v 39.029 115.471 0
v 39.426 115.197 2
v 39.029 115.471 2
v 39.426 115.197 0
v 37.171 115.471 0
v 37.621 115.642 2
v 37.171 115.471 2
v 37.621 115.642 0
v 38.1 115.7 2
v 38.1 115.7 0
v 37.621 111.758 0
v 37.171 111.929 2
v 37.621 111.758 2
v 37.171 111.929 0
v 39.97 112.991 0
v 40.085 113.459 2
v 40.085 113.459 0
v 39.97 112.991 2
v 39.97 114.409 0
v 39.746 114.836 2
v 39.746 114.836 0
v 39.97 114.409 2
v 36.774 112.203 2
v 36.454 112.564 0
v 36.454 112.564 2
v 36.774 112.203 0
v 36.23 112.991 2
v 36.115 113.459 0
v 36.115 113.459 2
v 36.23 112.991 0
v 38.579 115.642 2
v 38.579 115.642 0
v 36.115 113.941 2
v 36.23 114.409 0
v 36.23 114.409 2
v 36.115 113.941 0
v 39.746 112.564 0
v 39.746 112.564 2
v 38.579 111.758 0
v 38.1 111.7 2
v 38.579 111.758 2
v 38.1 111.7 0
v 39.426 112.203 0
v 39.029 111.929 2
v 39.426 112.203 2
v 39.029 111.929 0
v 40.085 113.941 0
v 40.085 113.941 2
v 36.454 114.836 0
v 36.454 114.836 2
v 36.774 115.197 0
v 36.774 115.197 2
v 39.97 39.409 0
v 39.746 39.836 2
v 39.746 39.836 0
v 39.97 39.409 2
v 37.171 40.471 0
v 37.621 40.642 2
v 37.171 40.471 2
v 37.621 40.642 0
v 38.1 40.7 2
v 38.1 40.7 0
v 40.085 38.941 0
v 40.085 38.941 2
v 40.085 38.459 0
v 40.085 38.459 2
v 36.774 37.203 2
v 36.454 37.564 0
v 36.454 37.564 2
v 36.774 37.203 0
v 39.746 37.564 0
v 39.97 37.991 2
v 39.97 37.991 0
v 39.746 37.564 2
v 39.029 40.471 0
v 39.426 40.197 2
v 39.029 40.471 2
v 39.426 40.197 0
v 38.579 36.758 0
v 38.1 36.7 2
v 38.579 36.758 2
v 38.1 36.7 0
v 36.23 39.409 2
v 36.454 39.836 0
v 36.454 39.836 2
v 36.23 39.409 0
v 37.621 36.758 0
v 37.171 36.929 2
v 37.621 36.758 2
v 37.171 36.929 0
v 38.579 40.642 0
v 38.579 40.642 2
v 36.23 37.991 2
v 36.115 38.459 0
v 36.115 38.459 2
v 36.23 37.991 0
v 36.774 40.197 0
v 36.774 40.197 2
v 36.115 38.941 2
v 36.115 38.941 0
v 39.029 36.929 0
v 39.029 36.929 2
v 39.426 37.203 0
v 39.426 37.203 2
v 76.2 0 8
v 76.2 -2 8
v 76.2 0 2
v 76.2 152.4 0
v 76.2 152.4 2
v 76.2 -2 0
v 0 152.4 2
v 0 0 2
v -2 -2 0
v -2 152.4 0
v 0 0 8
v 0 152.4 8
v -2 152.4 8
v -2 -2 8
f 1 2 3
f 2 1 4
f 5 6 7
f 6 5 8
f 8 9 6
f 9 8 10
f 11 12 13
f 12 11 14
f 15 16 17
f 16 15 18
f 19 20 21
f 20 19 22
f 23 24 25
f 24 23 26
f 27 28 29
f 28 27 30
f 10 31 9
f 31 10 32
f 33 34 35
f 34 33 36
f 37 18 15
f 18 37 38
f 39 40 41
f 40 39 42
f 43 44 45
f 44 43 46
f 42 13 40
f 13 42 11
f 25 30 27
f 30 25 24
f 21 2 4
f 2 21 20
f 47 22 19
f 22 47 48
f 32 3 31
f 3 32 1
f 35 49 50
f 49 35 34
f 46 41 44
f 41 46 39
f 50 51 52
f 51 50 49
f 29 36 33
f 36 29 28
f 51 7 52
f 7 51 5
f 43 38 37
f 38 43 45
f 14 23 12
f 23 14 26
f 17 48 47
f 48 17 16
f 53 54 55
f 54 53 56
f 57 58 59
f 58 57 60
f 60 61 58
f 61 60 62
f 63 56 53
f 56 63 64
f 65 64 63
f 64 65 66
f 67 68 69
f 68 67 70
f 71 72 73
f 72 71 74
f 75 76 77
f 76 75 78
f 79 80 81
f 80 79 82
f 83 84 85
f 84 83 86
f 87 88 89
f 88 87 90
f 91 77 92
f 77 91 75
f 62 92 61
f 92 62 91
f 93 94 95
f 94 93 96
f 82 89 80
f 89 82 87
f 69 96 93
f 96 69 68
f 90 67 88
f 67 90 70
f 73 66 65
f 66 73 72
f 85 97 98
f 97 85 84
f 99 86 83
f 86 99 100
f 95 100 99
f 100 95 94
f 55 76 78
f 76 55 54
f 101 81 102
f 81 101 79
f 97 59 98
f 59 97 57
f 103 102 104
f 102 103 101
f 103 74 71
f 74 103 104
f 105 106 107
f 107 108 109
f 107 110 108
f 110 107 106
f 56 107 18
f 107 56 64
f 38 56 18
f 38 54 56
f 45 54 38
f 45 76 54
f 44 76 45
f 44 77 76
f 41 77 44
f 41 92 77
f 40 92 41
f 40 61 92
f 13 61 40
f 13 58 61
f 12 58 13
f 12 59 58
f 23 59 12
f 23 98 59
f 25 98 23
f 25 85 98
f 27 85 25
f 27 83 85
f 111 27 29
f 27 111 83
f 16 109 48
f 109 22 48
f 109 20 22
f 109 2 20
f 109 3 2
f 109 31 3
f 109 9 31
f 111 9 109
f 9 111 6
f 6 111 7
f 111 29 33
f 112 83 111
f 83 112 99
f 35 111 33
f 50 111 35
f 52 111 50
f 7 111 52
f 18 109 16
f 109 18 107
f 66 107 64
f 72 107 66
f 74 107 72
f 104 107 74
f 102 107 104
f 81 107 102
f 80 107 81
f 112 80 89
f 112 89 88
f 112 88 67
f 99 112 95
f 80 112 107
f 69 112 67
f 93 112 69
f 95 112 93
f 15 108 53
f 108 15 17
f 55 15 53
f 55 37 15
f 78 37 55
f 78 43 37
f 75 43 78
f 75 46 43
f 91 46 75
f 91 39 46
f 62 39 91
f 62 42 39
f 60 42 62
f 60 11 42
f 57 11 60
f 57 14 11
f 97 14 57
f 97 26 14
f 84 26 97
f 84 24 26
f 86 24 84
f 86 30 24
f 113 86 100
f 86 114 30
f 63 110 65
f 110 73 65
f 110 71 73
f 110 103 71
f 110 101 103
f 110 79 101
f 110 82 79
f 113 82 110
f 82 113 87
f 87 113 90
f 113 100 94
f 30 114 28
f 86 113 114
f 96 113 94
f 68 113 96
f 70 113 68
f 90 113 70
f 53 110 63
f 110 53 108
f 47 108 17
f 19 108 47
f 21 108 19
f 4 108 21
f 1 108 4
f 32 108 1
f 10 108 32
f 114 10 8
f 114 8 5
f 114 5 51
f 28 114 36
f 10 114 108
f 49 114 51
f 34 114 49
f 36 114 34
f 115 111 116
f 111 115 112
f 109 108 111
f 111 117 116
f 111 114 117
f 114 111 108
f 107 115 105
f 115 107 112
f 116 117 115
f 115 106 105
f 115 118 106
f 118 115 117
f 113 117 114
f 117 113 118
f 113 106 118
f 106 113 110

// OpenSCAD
// file: lib/jig.scad
/******************************************************************************/
default_thickness = 2; // Thickness of the jig.
default_hole_diameter = 4;  // Size of hole to cut out of jig.

/******************************************************************************/
/*

  A single pole knob.

  Only requires that a single hole be cut out of the jig.

*/
module single_pole_knob(
  /* What size hole should be cut out of the jig? */
    hole_diameter = default_hole_diameter)
{
  height = 10;
  cylinder(d=hole_diameter, h=height, center=true);
}

/******************************************************************************/
/*

  A handle with two attachment points.

*/
module dual_pole_handle(
  /* Distance between the centers of the two poles. */
  pole_distance,

  /* What size hole should be cut out of the jig? */
  hole_diameter = default_hole_diameter)
{
  offset = pole_distance/2;

  for (i = [offset, -offset]) {
    translate([i, 0, 0])
      single_pole_knob(hole_diameter=hole_diameter);
  }
}

/******************************************************************************/
/*

  A jig for drilling holes in a cabinet door.

  Give the handle as a child object.
*/
module door_jig(
  /*
    How wide is the trim piece on the door?  The handle will be placed
    in the center of the trim.
  */
  width,

  /*
    How far from the bottom (or top) edge of the door to place the
    center of then handle?  If not given defaults to the `width'
    value.
  */
  handle_center,

  /*
    How thick do you want the jig to be?
  */
  thickness = default_thickness)
{
  height = handle_center == undef ? width * 2 : handle_center * 2;

  union() {
    difference() {
      // Plate.
      cube([width, height, thickness]);

      // Hole(s).
      translate([width/2, height/2, 0])
        rotate([0, 0, 90])
          children();
    }

    // Long edge.
    translate([-thickness, -thickness, 0])
      cube(size=[thickness, height+thickness, thickness*4]);

    // Short edge.
    translate([0, -thickness, 0])
      cube(size=[width, thickness, thickness*4]);
  }
}

/******************************************************************************/
/*

  A jig for drilling holes in a cabinet drawer.

  Give the handle as a child object.

*/
module drawer_jig(
  /*
    What is the height of the drawer?  The handle will be placed in
    the center of the drawer.  The jig will be slightly larger than
    half of this value.
  */
  height,

  /*
    How wide to make the jig.  A good value is the total width of the
    handle, maybe a little wider.
  */
  width,

  /*
    How thick do you want the jig to be?
  */
  thickness = default_thickness)
{
  edge_height = thickness * 4;

  jig_height = height / 2 + edge_height;
  jig_width = width;

  hole_x = jig_width / 2;
  hole_y = height / 2;

  difference() {
    union() {
      difference() {
        // Plate:
        cube([jig_width, jig_height, thickness]);

        // Holes:
        translate([hole_x, hole_y, 0])
          children();
      }

      // Edge:
      translate([0, -thickness, 0])
        cube([jig_width, thickness, edge_height]);
    }

    // Cut out to mark the center of the jig:
    translate([hole_x, 0, edge_height/2])
      cube(
        size=[thickness, edge_height, edge_height],
        center=true);
  }
}
// main file
/******************************************************************************/
use <lib/jig.scad>

/******************************************************************************/
$fa = 1.0;
$fs = 0.5;

/******************************************************************************/
door_jig(width=76.2) {

  dual_pole_handle(pole_distance=75);

  /* Or:
     single_pole_knob();
  */
};
